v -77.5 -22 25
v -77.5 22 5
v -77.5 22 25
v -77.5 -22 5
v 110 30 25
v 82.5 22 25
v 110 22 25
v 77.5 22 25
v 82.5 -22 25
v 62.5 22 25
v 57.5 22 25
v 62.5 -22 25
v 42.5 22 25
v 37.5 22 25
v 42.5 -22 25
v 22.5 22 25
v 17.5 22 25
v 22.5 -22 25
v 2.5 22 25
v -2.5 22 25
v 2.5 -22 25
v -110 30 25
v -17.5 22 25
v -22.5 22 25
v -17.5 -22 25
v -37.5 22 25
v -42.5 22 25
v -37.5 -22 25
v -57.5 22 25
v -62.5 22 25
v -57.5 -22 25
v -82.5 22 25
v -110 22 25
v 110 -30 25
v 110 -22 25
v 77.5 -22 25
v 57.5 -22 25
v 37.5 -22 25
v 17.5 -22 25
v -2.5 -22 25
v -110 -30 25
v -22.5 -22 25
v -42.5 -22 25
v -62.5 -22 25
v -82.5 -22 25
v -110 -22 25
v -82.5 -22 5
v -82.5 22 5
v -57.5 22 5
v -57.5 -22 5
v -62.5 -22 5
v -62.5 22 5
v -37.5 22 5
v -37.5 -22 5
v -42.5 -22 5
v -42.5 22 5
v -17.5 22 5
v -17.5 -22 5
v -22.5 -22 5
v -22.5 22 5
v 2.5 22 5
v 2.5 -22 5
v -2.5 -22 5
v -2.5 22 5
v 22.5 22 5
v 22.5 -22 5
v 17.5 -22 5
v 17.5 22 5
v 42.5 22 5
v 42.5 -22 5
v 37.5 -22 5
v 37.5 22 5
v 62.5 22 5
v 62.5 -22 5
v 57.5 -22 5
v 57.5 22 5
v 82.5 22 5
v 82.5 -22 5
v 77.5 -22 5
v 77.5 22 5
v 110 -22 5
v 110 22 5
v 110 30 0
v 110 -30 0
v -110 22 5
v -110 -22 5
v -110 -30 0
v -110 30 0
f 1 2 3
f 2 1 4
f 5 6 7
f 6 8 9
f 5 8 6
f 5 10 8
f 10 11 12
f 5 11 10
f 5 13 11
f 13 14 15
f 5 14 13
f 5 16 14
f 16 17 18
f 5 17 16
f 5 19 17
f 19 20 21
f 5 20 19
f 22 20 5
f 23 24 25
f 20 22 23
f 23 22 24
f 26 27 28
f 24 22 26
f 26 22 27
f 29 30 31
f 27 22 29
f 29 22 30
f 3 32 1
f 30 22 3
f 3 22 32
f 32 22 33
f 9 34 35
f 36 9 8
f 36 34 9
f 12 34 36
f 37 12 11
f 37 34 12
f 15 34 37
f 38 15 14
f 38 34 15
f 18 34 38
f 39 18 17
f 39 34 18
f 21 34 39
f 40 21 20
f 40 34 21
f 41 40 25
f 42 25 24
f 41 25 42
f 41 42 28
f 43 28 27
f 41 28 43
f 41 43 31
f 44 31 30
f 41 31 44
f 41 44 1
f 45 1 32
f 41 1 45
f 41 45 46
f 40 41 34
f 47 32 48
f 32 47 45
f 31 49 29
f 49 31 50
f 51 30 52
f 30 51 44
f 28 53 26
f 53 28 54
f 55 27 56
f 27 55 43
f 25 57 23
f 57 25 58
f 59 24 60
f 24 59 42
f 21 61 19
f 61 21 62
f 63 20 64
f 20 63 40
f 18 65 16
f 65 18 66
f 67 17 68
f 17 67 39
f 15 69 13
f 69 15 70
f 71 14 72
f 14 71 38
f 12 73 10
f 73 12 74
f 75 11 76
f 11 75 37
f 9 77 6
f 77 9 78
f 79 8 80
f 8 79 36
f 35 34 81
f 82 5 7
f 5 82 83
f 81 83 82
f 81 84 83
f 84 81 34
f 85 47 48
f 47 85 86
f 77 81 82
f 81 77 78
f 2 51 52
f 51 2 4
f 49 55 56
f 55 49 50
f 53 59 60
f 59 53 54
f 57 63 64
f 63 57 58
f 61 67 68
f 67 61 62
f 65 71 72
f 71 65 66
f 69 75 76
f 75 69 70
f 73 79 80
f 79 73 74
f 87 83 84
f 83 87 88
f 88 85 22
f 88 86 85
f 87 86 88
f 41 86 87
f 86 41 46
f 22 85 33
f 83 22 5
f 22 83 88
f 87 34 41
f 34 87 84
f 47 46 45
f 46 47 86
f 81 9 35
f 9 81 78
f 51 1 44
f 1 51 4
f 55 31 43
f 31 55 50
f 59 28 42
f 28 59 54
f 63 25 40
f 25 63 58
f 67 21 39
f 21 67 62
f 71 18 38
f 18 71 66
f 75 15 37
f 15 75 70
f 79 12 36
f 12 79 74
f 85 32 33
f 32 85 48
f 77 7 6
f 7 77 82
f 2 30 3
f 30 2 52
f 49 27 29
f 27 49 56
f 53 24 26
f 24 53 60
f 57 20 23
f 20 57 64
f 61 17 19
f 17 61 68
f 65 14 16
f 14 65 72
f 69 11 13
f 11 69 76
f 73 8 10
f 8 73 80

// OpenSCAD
$fn = 32;

// ----------------------------------------------------------------------
// Rib frame 220 x 60 x 25
// 9 ribs at 20 mm pitch
// ----------------------------------------------------------------------

// --- parameters (mm) ---
frame = [220, 60, 5];  // base plate size (x, y, z)
rail_w = 8;            // side rail width
ribs = 9;              // number of ribs
rib_t = 5;             // rib thickness
rib_h = 20;            // rib height above the base plate
pitch = 20;            // pitch between rib centres

// --- derived feature positions (mm) ---
span = (ribs - 1) * pitch;          // = 160   distance between the outer ribs
origin_x = -span / 2;               // = -80   X of the first rib
rib_len = frame[1] - 2 * rail_w + 2;  // = 46   rib length, 1 mm into each rail
feature_centers = [
  [origin_x + 0 * pitch, 0],
  [origin_x + 1 * pitch, 0],
  [origin_x + 2 * pitch, 0],
  [origin_x + 3 * pitch, 0],
  [origin_x + 4 * pitch, 0],
  [origin_x + 5 * pitch, 0],
  [origin_x + 6 * pitch, 0],
  [origin_x + 7 * pitch, 0],
  [origin_x + 8 * pitch, 0]
];   // rib centre line, drives the rib loop

// base plate, two side rails, then the ribs read straight off feature_centers
union() {
  translate([-frame[0] / 2, -frame[1] / 2, 0]) cube(frame);
  translate([-frame[0] / 2, -frame[1] / 2, 0]) cube([frame[0], rail_w, frame[2] + rib_h]);
  translate([-frame[0] / 2, frame[1] / 2 - rail_w, 0]) cube([frame[0], rail_w, frame[2] + rib_h]);
  for (centre = feature_centers)
    translate([centre[0] - rib_t / 2, centre[1] - rib_len / 2, frame[2] - 1])
      cube([rib_t, rib_len, rib_h + 1]);
}
